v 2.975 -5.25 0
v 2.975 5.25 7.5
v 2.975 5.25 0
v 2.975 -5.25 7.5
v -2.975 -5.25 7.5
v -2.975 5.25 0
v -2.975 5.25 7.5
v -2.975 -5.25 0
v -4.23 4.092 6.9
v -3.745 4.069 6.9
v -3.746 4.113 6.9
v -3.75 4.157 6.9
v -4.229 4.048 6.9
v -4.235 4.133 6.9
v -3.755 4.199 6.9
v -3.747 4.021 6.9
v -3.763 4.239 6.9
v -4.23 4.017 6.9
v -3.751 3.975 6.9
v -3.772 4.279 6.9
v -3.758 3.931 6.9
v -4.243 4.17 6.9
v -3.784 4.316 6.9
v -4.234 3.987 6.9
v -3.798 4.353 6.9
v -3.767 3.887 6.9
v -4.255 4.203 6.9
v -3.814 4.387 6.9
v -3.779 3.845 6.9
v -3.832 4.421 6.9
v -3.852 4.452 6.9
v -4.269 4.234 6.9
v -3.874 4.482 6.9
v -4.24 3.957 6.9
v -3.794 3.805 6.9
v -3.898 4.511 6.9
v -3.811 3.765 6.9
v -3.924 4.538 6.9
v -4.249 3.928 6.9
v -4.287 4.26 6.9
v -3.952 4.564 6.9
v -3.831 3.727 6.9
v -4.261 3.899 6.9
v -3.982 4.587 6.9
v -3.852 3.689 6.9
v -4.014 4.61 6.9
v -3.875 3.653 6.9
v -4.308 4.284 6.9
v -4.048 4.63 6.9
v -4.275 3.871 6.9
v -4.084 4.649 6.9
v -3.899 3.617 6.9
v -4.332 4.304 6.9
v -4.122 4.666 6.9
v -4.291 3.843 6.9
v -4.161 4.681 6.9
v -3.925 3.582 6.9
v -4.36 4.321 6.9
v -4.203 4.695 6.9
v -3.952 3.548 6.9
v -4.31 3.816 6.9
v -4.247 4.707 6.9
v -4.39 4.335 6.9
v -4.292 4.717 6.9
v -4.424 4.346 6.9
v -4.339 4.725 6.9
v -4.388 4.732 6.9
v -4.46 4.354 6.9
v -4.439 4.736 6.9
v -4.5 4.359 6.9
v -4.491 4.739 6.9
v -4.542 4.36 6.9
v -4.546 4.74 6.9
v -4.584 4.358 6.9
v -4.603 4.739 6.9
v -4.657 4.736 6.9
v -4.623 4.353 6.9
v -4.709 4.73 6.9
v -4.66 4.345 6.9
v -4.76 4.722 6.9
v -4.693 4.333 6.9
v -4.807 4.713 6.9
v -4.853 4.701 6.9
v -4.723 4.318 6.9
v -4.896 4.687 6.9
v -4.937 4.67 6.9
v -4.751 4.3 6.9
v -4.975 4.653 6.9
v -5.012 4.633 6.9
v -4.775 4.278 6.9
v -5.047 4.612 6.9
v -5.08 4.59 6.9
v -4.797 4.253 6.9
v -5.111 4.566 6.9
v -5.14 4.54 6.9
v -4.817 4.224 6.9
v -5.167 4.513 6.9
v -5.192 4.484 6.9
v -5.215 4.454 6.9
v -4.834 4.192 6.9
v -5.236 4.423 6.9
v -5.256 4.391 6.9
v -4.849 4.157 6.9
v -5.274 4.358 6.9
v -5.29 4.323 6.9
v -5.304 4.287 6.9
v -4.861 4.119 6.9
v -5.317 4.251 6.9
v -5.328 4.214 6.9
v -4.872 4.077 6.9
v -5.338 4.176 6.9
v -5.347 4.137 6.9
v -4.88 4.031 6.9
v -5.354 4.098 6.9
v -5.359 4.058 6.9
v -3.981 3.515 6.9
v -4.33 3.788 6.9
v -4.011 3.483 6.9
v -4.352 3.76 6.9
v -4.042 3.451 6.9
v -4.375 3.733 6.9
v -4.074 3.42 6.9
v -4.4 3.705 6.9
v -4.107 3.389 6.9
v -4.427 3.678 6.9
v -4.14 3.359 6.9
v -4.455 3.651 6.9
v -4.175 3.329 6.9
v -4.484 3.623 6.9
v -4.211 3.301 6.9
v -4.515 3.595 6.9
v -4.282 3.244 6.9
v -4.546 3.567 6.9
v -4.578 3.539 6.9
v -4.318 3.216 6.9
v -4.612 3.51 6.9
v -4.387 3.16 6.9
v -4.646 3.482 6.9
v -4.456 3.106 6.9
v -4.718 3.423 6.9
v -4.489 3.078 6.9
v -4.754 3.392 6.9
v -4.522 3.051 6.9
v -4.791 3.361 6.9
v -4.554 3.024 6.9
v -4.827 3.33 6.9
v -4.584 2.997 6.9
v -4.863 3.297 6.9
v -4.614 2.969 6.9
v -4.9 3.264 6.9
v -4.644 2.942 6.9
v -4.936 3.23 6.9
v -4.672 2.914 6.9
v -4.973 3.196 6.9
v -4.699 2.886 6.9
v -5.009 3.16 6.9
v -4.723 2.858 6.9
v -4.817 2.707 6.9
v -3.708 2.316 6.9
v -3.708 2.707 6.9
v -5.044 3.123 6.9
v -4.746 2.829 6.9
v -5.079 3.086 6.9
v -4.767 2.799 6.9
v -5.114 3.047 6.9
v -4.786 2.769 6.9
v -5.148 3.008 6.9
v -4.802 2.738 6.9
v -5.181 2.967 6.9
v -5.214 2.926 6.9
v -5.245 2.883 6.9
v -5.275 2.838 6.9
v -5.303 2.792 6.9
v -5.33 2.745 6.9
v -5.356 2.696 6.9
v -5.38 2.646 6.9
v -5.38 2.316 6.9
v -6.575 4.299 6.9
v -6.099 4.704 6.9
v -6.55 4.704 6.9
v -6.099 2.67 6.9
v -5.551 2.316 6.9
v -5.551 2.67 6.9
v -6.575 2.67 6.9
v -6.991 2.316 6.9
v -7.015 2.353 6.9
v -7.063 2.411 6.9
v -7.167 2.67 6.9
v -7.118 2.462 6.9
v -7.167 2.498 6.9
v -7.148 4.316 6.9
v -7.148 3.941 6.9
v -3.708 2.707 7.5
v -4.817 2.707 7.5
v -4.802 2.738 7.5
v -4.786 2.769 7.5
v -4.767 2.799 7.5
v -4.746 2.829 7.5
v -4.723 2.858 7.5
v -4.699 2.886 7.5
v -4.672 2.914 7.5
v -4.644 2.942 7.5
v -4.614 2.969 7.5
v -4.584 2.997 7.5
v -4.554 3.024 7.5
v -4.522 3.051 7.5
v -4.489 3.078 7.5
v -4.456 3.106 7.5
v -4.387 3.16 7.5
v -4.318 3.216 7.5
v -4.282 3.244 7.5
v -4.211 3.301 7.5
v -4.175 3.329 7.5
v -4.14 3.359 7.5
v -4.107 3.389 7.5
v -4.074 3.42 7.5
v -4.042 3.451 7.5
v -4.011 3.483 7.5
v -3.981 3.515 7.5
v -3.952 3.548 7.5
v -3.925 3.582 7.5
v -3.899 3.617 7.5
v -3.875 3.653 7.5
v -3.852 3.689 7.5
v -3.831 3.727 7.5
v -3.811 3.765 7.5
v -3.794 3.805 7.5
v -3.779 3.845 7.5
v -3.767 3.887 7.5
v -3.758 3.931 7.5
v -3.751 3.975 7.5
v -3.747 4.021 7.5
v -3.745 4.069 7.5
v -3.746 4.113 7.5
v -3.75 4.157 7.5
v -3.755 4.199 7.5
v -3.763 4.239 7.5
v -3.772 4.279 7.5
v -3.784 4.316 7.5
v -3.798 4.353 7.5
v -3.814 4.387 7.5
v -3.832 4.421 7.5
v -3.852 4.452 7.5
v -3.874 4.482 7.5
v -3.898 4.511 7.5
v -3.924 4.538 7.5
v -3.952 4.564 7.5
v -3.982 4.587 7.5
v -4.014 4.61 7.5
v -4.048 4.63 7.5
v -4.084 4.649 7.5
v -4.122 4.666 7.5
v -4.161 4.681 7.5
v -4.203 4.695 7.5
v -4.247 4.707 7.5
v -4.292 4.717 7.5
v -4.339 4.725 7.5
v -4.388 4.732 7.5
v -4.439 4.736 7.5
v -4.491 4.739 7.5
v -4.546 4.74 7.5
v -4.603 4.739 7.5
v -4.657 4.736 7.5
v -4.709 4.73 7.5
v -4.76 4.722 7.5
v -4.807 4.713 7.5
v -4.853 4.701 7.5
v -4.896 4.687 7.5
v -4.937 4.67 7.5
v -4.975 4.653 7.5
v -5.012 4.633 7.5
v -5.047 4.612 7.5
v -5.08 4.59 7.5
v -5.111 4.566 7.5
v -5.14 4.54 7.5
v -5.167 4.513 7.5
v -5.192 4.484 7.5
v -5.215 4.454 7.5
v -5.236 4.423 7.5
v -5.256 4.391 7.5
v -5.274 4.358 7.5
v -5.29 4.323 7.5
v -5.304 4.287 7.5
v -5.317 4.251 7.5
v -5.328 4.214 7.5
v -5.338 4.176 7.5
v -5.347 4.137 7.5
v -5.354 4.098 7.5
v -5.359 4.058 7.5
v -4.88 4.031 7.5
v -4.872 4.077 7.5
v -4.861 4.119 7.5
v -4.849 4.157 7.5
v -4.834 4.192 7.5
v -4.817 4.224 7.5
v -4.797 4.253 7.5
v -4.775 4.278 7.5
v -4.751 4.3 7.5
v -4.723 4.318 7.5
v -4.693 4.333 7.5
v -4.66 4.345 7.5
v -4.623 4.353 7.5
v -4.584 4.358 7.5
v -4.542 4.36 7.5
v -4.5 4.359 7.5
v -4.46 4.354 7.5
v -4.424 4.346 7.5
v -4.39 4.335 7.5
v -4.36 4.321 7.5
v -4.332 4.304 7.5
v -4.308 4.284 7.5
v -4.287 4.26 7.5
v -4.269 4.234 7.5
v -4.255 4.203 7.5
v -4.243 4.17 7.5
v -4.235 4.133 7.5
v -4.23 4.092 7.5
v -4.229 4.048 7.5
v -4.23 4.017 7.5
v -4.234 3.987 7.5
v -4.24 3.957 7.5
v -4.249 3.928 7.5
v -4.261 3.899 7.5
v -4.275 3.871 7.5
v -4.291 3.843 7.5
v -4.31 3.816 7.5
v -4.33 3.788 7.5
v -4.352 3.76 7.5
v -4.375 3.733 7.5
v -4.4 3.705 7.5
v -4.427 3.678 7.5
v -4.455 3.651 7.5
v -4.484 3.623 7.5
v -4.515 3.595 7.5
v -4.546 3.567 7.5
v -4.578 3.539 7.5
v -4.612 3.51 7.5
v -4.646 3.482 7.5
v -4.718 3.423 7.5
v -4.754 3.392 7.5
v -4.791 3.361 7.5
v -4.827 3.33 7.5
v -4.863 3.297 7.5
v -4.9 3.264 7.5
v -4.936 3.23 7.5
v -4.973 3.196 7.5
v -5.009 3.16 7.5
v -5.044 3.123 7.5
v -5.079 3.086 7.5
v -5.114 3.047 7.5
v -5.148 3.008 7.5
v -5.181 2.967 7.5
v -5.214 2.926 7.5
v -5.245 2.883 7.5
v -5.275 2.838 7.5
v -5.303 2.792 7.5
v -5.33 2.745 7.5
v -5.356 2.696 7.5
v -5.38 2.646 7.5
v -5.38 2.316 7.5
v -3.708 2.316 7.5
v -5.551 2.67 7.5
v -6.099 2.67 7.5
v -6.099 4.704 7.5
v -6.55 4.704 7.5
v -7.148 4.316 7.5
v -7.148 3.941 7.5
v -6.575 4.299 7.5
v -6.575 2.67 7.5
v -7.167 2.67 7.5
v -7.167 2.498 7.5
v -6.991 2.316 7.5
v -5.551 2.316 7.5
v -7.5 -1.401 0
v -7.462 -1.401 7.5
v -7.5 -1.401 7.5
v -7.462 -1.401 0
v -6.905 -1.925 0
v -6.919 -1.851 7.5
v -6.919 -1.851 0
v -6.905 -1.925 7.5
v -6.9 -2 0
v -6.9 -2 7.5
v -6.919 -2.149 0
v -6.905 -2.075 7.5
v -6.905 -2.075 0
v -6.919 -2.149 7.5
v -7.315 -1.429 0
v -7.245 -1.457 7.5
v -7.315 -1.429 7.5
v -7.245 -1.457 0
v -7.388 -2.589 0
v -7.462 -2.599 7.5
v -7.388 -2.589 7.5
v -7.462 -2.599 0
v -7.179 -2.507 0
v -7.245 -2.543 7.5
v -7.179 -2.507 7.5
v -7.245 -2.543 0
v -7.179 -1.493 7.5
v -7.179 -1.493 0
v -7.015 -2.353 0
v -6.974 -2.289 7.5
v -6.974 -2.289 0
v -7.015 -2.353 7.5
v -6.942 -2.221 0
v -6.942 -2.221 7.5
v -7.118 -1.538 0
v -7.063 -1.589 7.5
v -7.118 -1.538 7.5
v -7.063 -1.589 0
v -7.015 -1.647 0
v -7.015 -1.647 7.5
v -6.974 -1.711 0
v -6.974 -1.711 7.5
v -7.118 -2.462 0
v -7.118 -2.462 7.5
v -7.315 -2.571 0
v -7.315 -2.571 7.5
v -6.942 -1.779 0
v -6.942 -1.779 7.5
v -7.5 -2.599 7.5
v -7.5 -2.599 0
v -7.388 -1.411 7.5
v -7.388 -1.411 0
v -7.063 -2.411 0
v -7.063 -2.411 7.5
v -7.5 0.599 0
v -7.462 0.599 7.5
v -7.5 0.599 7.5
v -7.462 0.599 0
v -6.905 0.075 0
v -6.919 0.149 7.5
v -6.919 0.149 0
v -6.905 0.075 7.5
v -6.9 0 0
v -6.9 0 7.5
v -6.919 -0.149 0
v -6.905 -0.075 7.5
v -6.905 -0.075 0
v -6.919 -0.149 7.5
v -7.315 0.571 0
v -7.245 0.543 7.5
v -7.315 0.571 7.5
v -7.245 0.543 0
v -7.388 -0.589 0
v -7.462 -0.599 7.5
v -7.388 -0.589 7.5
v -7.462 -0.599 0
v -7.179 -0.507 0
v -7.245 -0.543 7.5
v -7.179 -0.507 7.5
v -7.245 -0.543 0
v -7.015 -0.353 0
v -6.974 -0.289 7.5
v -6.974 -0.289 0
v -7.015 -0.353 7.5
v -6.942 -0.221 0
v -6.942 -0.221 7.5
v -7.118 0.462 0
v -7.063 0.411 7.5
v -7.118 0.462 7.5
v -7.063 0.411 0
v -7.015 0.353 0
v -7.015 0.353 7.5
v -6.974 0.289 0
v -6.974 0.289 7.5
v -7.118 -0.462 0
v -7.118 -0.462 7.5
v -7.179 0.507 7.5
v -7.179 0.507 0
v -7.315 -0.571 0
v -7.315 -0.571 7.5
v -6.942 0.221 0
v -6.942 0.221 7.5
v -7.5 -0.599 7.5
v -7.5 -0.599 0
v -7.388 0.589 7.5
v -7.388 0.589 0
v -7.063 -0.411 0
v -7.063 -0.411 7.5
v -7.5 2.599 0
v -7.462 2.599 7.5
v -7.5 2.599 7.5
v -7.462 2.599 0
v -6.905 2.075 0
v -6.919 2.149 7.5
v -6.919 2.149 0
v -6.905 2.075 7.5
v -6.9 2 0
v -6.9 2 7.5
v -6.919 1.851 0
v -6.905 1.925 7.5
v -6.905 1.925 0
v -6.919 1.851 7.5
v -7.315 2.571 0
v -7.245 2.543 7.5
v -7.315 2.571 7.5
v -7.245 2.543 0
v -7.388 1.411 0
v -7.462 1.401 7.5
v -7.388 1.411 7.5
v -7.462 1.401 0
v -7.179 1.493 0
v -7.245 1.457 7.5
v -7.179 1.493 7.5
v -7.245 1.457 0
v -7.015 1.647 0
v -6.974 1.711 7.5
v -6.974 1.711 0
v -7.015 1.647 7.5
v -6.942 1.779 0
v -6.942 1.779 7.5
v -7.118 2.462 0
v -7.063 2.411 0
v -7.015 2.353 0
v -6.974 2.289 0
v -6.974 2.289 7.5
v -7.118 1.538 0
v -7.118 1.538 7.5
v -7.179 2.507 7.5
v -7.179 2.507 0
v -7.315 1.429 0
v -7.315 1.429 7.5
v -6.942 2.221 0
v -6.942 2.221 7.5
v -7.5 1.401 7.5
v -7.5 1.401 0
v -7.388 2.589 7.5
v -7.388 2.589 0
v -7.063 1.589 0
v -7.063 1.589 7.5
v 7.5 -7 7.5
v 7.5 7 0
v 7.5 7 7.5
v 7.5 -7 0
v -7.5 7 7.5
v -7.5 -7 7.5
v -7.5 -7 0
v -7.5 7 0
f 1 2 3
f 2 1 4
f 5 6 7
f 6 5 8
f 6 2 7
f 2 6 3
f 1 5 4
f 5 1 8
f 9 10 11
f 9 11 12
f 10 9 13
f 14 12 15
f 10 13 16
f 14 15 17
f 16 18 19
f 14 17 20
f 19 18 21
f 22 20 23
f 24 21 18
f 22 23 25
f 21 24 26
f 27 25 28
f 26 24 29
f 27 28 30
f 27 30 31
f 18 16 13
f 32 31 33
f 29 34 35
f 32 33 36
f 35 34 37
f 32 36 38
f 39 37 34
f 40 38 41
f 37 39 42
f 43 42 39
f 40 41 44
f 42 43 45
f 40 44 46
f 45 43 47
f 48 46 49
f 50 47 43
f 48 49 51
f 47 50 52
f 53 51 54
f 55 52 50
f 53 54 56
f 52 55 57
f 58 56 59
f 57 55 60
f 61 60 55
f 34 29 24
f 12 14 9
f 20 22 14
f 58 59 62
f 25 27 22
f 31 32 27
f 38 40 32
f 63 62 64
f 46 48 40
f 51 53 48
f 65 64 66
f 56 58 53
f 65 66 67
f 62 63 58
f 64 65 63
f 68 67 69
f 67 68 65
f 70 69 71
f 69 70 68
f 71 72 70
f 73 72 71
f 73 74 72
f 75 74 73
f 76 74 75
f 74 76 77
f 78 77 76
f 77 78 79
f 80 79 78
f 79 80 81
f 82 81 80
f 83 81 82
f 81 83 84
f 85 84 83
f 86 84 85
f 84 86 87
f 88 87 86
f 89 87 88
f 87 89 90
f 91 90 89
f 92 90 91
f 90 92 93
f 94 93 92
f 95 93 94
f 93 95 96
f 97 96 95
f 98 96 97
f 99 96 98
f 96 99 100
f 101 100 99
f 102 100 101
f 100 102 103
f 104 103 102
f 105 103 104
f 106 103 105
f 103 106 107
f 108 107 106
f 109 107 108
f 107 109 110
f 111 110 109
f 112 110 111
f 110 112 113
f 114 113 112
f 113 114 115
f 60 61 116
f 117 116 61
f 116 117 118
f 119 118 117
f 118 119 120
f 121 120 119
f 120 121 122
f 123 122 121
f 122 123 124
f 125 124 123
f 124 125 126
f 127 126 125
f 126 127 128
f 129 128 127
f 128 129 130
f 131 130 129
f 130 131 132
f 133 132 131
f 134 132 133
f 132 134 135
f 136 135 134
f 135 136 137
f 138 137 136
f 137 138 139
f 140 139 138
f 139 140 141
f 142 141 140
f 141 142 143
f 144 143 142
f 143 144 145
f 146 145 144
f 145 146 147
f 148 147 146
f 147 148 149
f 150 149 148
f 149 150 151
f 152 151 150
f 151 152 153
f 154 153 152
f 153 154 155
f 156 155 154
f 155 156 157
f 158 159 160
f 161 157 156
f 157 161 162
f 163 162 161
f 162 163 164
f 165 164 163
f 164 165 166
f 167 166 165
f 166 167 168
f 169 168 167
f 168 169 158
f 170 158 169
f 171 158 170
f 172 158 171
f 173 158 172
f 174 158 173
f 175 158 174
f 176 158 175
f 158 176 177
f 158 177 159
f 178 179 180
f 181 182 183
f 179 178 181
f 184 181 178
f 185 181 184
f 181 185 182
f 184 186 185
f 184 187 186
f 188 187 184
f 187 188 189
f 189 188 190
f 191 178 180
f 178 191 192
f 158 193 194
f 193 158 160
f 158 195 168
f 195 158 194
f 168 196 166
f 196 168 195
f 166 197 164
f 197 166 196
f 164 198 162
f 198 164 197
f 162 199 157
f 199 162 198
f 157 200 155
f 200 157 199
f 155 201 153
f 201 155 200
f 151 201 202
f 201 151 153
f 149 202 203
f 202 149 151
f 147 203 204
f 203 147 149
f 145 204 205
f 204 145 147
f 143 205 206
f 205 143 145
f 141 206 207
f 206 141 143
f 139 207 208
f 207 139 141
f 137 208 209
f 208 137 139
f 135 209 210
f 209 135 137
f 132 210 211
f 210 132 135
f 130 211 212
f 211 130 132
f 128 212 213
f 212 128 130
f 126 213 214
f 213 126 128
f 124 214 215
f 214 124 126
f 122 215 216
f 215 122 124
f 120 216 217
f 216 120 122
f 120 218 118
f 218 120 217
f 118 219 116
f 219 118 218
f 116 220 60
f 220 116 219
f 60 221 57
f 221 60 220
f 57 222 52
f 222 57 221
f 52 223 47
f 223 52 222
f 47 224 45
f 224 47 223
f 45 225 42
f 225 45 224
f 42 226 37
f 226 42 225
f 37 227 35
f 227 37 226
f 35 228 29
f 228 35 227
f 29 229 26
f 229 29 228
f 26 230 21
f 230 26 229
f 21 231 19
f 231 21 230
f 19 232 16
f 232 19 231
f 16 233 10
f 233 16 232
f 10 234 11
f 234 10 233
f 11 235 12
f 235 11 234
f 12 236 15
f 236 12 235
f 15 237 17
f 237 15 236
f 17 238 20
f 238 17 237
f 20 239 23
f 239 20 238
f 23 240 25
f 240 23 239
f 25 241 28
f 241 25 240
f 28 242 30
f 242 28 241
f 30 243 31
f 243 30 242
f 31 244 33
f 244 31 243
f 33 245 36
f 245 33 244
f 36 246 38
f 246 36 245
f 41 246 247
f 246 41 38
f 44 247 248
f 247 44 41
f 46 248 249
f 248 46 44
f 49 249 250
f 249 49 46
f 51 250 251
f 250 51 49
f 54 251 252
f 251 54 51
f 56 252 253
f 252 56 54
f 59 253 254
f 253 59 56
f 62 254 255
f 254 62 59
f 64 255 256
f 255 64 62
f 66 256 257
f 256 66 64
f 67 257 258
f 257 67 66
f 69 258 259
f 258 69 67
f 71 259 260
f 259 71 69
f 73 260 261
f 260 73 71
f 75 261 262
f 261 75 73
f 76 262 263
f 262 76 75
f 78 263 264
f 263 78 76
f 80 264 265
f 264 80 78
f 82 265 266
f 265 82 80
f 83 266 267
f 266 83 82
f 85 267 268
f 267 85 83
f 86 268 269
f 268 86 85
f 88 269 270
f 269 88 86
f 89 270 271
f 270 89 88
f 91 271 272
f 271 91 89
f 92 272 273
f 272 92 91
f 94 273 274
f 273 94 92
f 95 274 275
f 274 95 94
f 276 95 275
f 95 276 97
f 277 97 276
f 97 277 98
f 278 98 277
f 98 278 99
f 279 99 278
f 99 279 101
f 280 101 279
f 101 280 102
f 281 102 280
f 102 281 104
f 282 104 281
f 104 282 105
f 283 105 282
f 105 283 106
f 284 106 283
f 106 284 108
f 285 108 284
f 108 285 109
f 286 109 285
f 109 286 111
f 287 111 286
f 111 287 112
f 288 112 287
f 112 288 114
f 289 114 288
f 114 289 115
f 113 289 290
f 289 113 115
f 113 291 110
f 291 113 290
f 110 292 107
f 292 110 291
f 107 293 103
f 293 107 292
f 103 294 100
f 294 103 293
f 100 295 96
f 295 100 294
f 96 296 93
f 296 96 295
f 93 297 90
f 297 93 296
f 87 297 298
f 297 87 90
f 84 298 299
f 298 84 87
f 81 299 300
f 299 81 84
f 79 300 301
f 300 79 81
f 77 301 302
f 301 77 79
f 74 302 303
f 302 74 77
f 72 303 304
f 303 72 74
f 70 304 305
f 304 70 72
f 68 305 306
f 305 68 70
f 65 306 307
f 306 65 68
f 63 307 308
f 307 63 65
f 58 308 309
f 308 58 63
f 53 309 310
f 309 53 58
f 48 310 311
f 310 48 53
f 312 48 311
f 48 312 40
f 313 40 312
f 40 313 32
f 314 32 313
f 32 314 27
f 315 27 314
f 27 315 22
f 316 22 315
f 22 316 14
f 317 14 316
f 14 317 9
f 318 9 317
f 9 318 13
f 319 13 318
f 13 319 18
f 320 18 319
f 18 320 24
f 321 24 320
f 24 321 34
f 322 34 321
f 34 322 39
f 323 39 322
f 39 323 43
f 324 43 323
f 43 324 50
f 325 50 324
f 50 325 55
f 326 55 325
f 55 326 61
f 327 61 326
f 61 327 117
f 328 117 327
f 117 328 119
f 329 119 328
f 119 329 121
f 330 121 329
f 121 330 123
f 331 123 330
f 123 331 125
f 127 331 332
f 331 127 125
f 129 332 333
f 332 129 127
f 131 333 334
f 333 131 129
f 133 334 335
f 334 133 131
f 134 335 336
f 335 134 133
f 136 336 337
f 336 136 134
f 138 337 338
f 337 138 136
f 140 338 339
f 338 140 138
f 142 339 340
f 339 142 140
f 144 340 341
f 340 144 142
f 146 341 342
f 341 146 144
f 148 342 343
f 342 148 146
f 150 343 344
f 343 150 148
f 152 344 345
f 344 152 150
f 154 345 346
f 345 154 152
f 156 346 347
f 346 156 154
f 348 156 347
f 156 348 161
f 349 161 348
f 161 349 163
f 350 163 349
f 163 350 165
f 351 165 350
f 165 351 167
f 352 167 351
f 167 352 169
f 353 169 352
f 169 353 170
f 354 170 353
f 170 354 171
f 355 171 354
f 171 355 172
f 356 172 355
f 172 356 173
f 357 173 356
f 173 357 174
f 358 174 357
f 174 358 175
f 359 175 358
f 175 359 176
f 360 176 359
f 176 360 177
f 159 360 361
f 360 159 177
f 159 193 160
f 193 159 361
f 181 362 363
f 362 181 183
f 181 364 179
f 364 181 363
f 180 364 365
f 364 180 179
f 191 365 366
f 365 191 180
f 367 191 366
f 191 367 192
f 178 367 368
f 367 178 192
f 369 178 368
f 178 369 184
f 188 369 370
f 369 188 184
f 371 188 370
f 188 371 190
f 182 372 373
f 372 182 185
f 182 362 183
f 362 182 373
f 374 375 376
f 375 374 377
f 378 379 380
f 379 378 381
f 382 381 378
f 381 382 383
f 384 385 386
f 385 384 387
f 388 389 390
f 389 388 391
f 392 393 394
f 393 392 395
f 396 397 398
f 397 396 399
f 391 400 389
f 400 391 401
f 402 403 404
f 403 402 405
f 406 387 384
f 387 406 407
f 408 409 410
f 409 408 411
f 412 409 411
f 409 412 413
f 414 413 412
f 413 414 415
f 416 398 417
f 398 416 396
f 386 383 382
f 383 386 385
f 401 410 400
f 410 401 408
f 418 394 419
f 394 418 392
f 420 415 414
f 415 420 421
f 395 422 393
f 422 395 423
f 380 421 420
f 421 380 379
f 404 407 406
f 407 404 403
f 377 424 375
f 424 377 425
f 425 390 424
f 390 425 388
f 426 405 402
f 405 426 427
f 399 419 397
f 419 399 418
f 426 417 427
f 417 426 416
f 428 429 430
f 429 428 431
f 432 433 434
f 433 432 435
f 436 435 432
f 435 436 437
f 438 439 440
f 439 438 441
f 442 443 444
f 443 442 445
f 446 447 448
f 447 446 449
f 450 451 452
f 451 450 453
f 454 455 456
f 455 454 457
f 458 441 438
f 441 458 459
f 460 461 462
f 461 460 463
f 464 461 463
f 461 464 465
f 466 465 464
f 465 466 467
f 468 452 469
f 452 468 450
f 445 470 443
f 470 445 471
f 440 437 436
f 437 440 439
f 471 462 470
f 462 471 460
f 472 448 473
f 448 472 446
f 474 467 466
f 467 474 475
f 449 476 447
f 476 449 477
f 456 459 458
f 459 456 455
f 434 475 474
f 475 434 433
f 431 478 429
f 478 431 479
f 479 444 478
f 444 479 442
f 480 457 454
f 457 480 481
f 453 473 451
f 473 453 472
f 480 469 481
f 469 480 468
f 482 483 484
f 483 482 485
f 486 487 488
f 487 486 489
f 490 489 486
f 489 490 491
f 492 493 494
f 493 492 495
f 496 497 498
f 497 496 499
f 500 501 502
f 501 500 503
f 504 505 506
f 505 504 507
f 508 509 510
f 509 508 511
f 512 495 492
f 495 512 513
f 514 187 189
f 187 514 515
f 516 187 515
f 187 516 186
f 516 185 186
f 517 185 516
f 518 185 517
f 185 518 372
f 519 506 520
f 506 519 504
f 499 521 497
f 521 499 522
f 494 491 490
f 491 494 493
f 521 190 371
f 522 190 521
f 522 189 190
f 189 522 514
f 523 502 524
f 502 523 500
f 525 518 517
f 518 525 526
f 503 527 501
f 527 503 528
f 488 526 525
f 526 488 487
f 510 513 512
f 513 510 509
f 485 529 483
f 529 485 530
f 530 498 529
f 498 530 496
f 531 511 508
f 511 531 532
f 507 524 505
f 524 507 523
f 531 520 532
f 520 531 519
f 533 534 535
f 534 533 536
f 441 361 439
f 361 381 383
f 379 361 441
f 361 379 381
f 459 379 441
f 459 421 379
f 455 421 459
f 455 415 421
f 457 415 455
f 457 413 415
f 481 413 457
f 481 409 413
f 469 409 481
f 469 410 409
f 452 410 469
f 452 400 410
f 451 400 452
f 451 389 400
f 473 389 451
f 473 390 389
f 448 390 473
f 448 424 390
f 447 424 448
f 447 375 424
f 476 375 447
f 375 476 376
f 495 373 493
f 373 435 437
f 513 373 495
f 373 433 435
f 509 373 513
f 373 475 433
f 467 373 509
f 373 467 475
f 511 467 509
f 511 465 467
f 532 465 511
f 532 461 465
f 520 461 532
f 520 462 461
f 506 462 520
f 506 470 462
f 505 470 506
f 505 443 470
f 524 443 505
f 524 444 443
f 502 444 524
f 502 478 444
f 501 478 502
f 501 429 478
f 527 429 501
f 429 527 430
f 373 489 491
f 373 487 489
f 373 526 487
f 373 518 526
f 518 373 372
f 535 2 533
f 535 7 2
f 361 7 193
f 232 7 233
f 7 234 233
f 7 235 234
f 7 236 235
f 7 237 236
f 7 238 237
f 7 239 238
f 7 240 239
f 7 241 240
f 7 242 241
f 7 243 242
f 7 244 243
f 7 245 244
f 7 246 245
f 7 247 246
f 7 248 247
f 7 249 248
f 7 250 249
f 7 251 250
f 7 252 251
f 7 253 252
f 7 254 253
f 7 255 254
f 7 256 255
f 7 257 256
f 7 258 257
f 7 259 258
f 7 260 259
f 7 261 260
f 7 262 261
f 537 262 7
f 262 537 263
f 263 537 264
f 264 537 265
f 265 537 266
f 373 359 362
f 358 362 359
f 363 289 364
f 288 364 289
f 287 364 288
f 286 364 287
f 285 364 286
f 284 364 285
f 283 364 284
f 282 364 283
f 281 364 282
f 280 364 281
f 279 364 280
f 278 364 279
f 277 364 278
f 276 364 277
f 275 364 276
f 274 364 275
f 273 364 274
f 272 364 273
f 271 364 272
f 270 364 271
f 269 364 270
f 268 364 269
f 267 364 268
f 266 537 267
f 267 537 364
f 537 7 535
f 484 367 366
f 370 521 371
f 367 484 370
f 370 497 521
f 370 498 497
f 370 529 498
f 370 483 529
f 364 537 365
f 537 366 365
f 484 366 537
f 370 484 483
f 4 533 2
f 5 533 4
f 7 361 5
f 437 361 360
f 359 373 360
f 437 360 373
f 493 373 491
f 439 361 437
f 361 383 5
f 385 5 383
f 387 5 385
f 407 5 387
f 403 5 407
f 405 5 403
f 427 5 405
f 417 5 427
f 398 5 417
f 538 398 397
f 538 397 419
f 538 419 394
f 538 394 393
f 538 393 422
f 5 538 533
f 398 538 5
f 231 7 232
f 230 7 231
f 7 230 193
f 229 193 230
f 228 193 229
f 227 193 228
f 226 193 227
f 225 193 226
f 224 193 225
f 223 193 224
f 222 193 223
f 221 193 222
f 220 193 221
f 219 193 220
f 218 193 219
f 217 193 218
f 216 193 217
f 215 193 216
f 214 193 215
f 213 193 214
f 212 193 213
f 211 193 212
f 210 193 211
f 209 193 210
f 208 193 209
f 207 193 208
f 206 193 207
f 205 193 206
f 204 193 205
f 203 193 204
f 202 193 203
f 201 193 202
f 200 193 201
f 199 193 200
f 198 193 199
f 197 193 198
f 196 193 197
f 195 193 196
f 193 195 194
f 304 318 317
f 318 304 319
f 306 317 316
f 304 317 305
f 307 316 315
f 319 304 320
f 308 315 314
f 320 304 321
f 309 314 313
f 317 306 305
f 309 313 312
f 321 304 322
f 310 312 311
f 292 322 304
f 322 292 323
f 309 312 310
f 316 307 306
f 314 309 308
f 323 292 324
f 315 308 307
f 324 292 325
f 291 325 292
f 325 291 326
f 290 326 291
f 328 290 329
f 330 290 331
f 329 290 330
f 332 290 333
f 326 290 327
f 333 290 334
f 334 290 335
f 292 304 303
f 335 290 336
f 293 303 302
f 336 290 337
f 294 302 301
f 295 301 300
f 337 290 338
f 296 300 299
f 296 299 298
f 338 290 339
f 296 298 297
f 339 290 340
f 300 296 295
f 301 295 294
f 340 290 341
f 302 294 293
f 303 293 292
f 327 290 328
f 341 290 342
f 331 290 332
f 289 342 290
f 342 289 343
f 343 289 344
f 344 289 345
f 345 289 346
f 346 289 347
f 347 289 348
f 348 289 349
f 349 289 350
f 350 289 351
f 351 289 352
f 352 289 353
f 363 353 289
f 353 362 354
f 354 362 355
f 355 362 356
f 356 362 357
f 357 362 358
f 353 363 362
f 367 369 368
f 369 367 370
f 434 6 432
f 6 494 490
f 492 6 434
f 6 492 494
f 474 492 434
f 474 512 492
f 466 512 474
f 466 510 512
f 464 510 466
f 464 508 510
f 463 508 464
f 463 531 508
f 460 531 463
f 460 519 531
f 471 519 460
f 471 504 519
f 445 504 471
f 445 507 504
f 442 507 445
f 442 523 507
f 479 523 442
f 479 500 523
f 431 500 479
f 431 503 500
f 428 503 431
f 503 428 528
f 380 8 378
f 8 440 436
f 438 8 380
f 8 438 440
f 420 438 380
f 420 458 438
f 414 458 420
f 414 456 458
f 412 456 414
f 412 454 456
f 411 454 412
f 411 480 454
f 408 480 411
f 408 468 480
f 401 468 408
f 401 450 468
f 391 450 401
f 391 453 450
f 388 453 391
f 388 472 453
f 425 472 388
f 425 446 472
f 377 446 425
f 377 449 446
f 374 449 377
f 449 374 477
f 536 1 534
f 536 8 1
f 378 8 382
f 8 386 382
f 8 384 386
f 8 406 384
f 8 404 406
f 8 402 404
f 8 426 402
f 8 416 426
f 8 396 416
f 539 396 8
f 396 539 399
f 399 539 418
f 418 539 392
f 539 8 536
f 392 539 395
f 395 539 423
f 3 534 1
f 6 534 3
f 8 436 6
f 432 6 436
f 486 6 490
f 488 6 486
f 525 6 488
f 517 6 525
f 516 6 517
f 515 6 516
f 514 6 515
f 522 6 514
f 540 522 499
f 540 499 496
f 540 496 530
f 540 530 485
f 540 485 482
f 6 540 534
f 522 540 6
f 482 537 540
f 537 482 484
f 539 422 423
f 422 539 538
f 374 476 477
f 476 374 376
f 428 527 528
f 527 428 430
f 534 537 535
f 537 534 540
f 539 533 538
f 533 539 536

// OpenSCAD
$fn = 50;

difference() {
	union() {
		translate(v = [0, -5, 0]) {
			rotate(a = [0, 0, 0]) {
				difference() {
					union() {
						translate(v = [-7.5, -2.0, 0]) {
							cube(size = [15.0, 14.0, 7.5]);
						}
					}
					union() {
						translate(v = [-2.975, -0.25, -0.1]) {
							cube(size = [5.95, 10.5, 7.7]);
						}
						translate(v = [-5.5, 8.5, 6.9]) {
							linear_extrude(height = 0.7) {
								text(font = "Arial:style=Bold", halign = "center", size = 2.5, text = "12", valign = "center");
							}
						}
						translate(v = [-7.5, 3, -0.1]) {
							cylinder(h = 7.7, r = 0.6);
						}
						translate(v = [-7.5, 5, -0.1]) {
							cylinder(h = 7.7, r = 0.6);
						}
						translate(v = [-7.5, 7, -0.1]) {
							cylinder(h = 7.7, r = 0.6);
						}
					}
				}
			}
		}
	}
	union();
}
